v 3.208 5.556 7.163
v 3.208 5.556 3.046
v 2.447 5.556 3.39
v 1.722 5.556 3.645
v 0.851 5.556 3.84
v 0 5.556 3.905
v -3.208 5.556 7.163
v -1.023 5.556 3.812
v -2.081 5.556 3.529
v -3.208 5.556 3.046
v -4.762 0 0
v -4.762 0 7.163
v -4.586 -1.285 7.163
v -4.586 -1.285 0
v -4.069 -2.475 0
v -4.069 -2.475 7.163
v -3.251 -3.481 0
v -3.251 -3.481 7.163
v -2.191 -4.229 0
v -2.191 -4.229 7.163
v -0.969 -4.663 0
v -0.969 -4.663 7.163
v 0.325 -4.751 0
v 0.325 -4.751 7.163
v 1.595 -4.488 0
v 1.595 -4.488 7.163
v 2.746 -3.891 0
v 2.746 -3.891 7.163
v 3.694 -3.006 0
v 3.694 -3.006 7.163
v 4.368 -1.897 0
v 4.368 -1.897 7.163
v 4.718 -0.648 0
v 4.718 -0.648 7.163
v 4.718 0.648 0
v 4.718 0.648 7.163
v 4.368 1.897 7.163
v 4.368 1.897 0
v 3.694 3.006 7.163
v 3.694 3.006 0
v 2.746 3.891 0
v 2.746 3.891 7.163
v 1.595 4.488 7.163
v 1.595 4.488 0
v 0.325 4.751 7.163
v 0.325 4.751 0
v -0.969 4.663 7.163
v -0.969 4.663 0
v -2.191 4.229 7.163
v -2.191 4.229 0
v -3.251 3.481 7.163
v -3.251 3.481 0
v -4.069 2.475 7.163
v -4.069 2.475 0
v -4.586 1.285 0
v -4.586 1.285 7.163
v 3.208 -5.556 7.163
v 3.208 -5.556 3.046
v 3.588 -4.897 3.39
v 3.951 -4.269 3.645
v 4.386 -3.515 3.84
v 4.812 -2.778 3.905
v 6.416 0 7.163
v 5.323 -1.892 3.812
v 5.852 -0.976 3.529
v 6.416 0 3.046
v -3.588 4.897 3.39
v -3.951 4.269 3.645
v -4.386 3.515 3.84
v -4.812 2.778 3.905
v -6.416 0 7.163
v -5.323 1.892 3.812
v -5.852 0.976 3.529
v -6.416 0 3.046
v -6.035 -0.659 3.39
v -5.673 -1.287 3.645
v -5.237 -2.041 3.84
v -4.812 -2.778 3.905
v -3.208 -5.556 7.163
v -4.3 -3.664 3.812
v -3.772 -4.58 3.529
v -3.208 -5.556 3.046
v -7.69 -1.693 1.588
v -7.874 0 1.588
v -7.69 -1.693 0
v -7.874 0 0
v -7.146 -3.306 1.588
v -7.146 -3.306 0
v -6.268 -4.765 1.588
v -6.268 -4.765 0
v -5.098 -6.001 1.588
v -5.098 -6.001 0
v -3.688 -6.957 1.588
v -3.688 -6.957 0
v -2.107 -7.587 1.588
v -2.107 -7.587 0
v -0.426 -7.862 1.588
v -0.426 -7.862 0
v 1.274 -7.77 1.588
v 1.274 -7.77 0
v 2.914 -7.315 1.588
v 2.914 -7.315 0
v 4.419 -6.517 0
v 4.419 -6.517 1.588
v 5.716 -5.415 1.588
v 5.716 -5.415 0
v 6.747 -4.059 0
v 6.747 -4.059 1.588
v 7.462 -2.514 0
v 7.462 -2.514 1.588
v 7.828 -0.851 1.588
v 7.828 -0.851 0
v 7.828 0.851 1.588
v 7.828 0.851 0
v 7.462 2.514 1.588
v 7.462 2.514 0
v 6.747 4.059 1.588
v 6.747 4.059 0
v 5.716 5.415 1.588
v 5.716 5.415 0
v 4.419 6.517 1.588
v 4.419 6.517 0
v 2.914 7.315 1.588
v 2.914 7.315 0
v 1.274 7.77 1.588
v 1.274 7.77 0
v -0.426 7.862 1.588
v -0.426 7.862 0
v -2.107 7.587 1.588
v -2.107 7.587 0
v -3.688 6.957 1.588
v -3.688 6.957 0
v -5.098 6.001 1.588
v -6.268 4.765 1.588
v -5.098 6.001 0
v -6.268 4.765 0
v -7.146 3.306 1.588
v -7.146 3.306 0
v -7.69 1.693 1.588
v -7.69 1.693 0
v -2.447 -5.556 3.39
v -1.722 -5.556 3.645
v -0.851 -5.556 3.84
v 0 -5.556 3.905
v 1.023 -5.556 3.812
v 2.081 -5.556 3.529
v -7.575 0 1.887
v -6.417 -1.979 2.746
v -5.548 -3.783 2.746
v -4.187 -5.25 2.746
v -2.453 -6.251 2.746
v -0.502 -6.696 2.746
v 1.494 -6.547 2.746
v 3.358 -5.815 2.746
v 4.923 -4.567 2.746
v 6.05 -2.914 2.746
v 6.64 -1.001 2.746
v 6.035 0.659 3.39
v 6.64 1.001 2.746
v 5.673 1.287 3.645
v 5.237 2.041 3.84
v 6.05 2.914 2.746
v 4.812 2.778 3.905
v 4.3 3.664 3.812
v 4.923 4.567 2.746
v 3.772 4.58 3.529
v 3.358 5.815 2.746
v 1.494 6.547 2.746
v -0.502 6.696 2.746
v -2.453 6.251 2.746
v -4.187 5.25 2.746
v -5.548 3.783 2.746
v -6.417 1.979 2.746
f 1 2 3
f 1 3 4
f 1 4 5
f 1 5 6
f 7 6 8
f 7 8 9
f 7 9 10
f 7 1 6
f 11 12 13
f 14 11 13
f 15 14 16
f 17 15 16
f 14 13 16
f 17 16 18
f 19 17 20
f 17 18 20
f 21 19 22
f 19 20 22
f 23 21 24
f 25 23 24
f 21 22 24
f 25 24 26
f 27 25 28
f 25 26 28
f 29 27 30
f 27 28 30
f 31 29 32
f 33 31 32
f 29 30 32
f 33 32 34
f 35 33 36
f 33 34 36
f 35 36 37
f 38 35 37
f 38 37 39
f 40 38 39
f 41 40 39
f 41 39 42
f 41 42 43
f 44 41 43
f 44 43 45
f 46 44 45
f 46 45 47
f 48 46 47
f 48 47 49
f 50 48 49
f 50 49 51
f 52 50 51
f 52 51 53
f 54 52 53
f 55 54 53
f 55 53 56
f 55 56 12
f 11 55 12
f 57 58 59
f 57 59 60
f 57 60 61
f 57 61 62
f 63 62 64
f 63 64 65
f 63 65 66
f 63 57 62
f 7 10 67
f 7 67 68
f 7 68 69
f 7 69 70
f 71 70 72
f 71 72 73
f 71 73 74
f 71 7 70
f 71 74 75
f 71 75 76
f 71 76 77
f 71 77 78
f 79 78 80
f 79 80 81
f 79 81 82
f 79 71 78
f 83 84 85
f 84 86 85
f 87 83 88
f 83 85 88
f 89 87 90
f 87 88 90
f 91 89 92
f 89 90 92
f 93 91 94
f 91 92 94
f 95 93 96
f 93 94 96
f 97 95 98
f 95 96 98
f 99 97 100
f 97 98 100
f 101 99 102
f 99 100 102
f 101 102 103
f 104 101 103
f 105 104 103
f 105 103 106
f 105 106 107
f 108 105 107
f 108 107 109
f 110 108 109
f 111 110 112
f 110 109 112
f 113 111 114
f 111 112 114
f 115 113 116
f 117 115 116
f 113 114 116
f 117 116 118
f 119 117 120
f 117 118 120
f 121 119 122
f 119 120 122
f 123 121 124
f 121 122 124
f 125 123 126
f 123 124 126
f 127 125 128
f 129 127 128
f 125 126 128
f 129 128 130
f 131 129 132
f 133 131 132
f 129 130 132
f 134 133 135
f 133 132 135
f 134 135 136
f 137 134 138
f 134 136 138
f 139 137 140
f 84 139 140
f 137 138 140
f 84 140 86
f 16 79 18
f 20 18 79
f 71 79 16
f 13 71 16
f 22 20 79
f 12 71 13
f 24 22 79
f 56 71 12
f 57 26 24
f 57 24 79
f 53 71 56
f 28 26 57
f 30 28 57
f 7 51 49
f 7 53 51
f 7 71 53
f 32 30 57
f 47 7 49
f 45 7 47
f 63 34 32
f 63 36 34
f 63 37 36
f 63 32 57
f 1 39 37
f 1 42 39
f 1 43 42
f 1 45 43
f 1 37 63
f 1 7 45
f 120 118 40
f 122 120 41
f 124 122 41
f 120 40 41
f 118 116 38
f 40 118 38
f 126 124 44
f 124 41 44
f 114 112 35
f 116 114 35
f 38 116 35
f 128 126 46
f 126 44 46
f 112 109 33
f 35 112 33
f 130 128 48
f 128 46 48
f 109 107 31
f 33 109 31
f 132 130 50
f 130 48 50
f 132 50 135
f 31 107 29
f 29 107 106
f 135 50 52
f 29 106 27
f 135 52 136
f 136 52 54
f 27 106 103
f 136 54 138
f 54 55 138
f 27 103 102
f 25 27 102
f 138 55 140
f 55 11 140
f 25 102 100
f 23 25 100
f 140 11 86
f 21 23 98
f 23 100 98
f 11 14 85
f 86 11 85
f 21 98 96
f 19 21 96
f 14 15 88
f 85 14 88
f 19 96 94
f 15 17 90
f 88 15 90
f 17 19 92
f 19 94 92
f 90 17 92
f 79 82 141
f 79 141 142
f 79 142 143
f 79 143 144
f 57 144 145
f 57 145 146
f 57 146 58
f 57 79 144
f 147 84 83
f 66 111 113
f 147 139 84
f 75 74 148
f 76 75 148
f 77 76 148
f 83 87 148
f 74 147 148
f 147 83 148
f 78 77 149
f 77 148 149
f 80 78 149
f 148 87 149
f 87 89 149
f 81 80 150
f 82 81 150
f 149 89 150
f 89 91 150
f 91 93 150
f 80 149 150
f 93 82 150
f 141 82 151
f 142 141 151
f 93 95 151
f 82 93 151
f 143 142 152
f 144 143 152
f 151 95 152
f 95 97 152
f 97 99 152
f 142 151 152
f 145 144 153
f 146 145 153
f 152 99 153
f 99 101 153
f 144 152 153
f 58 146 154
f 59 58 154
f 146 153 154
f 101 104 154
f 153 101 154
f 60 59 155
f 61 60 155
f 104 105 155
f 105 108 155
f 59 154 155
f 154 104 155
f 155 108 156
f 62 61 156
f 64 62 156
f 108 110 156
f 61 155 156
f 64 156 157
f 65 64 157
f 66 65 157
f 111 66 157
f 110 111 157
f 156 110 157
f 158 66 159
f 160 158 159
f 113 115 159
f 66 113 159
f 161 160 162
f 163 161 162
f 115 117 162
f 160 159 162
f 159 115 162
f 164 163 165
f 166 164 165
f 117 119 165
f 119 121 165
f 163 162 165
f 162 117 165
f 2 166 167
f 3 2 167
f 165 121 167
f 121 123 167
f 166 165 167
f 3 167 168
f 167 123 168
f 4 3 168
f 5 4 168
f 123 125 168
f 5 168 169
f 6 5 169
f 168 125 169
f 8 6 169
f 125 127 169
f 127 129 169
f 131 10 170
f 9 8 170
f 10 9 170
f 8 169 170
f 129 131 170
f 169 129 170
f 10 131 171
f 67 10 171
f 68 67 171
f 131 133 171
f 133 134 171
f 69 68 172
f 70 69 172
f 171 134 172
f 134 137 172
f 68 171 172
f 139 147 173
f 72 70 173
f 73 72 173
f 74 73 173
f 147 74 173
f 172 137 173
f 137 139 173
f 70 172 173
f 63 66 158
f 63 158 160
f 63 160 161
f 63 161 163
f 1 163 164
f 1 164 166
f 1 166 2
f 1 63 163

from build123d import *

# Parameters (mm, degrees)
BOSS_EXTRUDE1_REACH = 15.24
SKETCH2_R           = 4.7625


with BuildPart() as part:
    # Sketch1 → Revolve1 (revolve)
    with BuildSketch(Plane(origin=(0, 0, 0), x_dir=(0, 0, -1), z_dir=(1, 0, 0)), mode=Mode.PRIVATE) as revolve1_sk:
        Polygon((0, 4.7625), (-7.1628, 4.7625), (-7.1628, 5.55625), (-3.90525, 5.55625), (-1.5875, 7.874), (0, 7.874), align=None)
    revolve(revolve1_sk.sketch.rotate(Axis((0, 0, 0), (0, 0, 1)), 90), axis=Axis((0, 0, 0), (0, 0, 1)))

    # Boss-Extrude1: up to this cone (the profile starts outside it)
    boss_extrude1_end = Plane(origin=(0, 0, 7.1628), z_dir=(0, 0, -1)).offset(-2.298699) * Cone(1e-06, 20.3374, 20.337399, align=(Align.CENTER, Align.CENTER, Align.MIN), mode=Mode.PRIVATE)
    # Sketch2 → Boss-Extrude1 (add, up to the surface)
    with BuildSketch(Plane.XY.offset(7.1628), mode=Mode.PRIVATE) as boss_extrude1_sk1:
        Polygon((-3.207902433, 5.55625), (-6.415804866, 0), (-3.207902433, -5.55625), (3.207902433, -5.55625), (6.415804866, 0), (3.207902433, 5.55625), align=None)
        with Locations(Location((0, 0, 0), (0, 0, 180))):
            Circle(SKETCH2_R, mode=Mode.SUBTRACT)
    boss_extrude1_tool1 = extrude(boss_extrude1_sk1.sketch, amount=-BOSS_EXTRUDE1_REACH, mode=Mode.PRIVATE) - boss_extrude1_end
    add(boss_extrude1_tool1.solids().sort_by_distance((-4.664849, 2.693252, 7.1628))[0])


solid = part.part
